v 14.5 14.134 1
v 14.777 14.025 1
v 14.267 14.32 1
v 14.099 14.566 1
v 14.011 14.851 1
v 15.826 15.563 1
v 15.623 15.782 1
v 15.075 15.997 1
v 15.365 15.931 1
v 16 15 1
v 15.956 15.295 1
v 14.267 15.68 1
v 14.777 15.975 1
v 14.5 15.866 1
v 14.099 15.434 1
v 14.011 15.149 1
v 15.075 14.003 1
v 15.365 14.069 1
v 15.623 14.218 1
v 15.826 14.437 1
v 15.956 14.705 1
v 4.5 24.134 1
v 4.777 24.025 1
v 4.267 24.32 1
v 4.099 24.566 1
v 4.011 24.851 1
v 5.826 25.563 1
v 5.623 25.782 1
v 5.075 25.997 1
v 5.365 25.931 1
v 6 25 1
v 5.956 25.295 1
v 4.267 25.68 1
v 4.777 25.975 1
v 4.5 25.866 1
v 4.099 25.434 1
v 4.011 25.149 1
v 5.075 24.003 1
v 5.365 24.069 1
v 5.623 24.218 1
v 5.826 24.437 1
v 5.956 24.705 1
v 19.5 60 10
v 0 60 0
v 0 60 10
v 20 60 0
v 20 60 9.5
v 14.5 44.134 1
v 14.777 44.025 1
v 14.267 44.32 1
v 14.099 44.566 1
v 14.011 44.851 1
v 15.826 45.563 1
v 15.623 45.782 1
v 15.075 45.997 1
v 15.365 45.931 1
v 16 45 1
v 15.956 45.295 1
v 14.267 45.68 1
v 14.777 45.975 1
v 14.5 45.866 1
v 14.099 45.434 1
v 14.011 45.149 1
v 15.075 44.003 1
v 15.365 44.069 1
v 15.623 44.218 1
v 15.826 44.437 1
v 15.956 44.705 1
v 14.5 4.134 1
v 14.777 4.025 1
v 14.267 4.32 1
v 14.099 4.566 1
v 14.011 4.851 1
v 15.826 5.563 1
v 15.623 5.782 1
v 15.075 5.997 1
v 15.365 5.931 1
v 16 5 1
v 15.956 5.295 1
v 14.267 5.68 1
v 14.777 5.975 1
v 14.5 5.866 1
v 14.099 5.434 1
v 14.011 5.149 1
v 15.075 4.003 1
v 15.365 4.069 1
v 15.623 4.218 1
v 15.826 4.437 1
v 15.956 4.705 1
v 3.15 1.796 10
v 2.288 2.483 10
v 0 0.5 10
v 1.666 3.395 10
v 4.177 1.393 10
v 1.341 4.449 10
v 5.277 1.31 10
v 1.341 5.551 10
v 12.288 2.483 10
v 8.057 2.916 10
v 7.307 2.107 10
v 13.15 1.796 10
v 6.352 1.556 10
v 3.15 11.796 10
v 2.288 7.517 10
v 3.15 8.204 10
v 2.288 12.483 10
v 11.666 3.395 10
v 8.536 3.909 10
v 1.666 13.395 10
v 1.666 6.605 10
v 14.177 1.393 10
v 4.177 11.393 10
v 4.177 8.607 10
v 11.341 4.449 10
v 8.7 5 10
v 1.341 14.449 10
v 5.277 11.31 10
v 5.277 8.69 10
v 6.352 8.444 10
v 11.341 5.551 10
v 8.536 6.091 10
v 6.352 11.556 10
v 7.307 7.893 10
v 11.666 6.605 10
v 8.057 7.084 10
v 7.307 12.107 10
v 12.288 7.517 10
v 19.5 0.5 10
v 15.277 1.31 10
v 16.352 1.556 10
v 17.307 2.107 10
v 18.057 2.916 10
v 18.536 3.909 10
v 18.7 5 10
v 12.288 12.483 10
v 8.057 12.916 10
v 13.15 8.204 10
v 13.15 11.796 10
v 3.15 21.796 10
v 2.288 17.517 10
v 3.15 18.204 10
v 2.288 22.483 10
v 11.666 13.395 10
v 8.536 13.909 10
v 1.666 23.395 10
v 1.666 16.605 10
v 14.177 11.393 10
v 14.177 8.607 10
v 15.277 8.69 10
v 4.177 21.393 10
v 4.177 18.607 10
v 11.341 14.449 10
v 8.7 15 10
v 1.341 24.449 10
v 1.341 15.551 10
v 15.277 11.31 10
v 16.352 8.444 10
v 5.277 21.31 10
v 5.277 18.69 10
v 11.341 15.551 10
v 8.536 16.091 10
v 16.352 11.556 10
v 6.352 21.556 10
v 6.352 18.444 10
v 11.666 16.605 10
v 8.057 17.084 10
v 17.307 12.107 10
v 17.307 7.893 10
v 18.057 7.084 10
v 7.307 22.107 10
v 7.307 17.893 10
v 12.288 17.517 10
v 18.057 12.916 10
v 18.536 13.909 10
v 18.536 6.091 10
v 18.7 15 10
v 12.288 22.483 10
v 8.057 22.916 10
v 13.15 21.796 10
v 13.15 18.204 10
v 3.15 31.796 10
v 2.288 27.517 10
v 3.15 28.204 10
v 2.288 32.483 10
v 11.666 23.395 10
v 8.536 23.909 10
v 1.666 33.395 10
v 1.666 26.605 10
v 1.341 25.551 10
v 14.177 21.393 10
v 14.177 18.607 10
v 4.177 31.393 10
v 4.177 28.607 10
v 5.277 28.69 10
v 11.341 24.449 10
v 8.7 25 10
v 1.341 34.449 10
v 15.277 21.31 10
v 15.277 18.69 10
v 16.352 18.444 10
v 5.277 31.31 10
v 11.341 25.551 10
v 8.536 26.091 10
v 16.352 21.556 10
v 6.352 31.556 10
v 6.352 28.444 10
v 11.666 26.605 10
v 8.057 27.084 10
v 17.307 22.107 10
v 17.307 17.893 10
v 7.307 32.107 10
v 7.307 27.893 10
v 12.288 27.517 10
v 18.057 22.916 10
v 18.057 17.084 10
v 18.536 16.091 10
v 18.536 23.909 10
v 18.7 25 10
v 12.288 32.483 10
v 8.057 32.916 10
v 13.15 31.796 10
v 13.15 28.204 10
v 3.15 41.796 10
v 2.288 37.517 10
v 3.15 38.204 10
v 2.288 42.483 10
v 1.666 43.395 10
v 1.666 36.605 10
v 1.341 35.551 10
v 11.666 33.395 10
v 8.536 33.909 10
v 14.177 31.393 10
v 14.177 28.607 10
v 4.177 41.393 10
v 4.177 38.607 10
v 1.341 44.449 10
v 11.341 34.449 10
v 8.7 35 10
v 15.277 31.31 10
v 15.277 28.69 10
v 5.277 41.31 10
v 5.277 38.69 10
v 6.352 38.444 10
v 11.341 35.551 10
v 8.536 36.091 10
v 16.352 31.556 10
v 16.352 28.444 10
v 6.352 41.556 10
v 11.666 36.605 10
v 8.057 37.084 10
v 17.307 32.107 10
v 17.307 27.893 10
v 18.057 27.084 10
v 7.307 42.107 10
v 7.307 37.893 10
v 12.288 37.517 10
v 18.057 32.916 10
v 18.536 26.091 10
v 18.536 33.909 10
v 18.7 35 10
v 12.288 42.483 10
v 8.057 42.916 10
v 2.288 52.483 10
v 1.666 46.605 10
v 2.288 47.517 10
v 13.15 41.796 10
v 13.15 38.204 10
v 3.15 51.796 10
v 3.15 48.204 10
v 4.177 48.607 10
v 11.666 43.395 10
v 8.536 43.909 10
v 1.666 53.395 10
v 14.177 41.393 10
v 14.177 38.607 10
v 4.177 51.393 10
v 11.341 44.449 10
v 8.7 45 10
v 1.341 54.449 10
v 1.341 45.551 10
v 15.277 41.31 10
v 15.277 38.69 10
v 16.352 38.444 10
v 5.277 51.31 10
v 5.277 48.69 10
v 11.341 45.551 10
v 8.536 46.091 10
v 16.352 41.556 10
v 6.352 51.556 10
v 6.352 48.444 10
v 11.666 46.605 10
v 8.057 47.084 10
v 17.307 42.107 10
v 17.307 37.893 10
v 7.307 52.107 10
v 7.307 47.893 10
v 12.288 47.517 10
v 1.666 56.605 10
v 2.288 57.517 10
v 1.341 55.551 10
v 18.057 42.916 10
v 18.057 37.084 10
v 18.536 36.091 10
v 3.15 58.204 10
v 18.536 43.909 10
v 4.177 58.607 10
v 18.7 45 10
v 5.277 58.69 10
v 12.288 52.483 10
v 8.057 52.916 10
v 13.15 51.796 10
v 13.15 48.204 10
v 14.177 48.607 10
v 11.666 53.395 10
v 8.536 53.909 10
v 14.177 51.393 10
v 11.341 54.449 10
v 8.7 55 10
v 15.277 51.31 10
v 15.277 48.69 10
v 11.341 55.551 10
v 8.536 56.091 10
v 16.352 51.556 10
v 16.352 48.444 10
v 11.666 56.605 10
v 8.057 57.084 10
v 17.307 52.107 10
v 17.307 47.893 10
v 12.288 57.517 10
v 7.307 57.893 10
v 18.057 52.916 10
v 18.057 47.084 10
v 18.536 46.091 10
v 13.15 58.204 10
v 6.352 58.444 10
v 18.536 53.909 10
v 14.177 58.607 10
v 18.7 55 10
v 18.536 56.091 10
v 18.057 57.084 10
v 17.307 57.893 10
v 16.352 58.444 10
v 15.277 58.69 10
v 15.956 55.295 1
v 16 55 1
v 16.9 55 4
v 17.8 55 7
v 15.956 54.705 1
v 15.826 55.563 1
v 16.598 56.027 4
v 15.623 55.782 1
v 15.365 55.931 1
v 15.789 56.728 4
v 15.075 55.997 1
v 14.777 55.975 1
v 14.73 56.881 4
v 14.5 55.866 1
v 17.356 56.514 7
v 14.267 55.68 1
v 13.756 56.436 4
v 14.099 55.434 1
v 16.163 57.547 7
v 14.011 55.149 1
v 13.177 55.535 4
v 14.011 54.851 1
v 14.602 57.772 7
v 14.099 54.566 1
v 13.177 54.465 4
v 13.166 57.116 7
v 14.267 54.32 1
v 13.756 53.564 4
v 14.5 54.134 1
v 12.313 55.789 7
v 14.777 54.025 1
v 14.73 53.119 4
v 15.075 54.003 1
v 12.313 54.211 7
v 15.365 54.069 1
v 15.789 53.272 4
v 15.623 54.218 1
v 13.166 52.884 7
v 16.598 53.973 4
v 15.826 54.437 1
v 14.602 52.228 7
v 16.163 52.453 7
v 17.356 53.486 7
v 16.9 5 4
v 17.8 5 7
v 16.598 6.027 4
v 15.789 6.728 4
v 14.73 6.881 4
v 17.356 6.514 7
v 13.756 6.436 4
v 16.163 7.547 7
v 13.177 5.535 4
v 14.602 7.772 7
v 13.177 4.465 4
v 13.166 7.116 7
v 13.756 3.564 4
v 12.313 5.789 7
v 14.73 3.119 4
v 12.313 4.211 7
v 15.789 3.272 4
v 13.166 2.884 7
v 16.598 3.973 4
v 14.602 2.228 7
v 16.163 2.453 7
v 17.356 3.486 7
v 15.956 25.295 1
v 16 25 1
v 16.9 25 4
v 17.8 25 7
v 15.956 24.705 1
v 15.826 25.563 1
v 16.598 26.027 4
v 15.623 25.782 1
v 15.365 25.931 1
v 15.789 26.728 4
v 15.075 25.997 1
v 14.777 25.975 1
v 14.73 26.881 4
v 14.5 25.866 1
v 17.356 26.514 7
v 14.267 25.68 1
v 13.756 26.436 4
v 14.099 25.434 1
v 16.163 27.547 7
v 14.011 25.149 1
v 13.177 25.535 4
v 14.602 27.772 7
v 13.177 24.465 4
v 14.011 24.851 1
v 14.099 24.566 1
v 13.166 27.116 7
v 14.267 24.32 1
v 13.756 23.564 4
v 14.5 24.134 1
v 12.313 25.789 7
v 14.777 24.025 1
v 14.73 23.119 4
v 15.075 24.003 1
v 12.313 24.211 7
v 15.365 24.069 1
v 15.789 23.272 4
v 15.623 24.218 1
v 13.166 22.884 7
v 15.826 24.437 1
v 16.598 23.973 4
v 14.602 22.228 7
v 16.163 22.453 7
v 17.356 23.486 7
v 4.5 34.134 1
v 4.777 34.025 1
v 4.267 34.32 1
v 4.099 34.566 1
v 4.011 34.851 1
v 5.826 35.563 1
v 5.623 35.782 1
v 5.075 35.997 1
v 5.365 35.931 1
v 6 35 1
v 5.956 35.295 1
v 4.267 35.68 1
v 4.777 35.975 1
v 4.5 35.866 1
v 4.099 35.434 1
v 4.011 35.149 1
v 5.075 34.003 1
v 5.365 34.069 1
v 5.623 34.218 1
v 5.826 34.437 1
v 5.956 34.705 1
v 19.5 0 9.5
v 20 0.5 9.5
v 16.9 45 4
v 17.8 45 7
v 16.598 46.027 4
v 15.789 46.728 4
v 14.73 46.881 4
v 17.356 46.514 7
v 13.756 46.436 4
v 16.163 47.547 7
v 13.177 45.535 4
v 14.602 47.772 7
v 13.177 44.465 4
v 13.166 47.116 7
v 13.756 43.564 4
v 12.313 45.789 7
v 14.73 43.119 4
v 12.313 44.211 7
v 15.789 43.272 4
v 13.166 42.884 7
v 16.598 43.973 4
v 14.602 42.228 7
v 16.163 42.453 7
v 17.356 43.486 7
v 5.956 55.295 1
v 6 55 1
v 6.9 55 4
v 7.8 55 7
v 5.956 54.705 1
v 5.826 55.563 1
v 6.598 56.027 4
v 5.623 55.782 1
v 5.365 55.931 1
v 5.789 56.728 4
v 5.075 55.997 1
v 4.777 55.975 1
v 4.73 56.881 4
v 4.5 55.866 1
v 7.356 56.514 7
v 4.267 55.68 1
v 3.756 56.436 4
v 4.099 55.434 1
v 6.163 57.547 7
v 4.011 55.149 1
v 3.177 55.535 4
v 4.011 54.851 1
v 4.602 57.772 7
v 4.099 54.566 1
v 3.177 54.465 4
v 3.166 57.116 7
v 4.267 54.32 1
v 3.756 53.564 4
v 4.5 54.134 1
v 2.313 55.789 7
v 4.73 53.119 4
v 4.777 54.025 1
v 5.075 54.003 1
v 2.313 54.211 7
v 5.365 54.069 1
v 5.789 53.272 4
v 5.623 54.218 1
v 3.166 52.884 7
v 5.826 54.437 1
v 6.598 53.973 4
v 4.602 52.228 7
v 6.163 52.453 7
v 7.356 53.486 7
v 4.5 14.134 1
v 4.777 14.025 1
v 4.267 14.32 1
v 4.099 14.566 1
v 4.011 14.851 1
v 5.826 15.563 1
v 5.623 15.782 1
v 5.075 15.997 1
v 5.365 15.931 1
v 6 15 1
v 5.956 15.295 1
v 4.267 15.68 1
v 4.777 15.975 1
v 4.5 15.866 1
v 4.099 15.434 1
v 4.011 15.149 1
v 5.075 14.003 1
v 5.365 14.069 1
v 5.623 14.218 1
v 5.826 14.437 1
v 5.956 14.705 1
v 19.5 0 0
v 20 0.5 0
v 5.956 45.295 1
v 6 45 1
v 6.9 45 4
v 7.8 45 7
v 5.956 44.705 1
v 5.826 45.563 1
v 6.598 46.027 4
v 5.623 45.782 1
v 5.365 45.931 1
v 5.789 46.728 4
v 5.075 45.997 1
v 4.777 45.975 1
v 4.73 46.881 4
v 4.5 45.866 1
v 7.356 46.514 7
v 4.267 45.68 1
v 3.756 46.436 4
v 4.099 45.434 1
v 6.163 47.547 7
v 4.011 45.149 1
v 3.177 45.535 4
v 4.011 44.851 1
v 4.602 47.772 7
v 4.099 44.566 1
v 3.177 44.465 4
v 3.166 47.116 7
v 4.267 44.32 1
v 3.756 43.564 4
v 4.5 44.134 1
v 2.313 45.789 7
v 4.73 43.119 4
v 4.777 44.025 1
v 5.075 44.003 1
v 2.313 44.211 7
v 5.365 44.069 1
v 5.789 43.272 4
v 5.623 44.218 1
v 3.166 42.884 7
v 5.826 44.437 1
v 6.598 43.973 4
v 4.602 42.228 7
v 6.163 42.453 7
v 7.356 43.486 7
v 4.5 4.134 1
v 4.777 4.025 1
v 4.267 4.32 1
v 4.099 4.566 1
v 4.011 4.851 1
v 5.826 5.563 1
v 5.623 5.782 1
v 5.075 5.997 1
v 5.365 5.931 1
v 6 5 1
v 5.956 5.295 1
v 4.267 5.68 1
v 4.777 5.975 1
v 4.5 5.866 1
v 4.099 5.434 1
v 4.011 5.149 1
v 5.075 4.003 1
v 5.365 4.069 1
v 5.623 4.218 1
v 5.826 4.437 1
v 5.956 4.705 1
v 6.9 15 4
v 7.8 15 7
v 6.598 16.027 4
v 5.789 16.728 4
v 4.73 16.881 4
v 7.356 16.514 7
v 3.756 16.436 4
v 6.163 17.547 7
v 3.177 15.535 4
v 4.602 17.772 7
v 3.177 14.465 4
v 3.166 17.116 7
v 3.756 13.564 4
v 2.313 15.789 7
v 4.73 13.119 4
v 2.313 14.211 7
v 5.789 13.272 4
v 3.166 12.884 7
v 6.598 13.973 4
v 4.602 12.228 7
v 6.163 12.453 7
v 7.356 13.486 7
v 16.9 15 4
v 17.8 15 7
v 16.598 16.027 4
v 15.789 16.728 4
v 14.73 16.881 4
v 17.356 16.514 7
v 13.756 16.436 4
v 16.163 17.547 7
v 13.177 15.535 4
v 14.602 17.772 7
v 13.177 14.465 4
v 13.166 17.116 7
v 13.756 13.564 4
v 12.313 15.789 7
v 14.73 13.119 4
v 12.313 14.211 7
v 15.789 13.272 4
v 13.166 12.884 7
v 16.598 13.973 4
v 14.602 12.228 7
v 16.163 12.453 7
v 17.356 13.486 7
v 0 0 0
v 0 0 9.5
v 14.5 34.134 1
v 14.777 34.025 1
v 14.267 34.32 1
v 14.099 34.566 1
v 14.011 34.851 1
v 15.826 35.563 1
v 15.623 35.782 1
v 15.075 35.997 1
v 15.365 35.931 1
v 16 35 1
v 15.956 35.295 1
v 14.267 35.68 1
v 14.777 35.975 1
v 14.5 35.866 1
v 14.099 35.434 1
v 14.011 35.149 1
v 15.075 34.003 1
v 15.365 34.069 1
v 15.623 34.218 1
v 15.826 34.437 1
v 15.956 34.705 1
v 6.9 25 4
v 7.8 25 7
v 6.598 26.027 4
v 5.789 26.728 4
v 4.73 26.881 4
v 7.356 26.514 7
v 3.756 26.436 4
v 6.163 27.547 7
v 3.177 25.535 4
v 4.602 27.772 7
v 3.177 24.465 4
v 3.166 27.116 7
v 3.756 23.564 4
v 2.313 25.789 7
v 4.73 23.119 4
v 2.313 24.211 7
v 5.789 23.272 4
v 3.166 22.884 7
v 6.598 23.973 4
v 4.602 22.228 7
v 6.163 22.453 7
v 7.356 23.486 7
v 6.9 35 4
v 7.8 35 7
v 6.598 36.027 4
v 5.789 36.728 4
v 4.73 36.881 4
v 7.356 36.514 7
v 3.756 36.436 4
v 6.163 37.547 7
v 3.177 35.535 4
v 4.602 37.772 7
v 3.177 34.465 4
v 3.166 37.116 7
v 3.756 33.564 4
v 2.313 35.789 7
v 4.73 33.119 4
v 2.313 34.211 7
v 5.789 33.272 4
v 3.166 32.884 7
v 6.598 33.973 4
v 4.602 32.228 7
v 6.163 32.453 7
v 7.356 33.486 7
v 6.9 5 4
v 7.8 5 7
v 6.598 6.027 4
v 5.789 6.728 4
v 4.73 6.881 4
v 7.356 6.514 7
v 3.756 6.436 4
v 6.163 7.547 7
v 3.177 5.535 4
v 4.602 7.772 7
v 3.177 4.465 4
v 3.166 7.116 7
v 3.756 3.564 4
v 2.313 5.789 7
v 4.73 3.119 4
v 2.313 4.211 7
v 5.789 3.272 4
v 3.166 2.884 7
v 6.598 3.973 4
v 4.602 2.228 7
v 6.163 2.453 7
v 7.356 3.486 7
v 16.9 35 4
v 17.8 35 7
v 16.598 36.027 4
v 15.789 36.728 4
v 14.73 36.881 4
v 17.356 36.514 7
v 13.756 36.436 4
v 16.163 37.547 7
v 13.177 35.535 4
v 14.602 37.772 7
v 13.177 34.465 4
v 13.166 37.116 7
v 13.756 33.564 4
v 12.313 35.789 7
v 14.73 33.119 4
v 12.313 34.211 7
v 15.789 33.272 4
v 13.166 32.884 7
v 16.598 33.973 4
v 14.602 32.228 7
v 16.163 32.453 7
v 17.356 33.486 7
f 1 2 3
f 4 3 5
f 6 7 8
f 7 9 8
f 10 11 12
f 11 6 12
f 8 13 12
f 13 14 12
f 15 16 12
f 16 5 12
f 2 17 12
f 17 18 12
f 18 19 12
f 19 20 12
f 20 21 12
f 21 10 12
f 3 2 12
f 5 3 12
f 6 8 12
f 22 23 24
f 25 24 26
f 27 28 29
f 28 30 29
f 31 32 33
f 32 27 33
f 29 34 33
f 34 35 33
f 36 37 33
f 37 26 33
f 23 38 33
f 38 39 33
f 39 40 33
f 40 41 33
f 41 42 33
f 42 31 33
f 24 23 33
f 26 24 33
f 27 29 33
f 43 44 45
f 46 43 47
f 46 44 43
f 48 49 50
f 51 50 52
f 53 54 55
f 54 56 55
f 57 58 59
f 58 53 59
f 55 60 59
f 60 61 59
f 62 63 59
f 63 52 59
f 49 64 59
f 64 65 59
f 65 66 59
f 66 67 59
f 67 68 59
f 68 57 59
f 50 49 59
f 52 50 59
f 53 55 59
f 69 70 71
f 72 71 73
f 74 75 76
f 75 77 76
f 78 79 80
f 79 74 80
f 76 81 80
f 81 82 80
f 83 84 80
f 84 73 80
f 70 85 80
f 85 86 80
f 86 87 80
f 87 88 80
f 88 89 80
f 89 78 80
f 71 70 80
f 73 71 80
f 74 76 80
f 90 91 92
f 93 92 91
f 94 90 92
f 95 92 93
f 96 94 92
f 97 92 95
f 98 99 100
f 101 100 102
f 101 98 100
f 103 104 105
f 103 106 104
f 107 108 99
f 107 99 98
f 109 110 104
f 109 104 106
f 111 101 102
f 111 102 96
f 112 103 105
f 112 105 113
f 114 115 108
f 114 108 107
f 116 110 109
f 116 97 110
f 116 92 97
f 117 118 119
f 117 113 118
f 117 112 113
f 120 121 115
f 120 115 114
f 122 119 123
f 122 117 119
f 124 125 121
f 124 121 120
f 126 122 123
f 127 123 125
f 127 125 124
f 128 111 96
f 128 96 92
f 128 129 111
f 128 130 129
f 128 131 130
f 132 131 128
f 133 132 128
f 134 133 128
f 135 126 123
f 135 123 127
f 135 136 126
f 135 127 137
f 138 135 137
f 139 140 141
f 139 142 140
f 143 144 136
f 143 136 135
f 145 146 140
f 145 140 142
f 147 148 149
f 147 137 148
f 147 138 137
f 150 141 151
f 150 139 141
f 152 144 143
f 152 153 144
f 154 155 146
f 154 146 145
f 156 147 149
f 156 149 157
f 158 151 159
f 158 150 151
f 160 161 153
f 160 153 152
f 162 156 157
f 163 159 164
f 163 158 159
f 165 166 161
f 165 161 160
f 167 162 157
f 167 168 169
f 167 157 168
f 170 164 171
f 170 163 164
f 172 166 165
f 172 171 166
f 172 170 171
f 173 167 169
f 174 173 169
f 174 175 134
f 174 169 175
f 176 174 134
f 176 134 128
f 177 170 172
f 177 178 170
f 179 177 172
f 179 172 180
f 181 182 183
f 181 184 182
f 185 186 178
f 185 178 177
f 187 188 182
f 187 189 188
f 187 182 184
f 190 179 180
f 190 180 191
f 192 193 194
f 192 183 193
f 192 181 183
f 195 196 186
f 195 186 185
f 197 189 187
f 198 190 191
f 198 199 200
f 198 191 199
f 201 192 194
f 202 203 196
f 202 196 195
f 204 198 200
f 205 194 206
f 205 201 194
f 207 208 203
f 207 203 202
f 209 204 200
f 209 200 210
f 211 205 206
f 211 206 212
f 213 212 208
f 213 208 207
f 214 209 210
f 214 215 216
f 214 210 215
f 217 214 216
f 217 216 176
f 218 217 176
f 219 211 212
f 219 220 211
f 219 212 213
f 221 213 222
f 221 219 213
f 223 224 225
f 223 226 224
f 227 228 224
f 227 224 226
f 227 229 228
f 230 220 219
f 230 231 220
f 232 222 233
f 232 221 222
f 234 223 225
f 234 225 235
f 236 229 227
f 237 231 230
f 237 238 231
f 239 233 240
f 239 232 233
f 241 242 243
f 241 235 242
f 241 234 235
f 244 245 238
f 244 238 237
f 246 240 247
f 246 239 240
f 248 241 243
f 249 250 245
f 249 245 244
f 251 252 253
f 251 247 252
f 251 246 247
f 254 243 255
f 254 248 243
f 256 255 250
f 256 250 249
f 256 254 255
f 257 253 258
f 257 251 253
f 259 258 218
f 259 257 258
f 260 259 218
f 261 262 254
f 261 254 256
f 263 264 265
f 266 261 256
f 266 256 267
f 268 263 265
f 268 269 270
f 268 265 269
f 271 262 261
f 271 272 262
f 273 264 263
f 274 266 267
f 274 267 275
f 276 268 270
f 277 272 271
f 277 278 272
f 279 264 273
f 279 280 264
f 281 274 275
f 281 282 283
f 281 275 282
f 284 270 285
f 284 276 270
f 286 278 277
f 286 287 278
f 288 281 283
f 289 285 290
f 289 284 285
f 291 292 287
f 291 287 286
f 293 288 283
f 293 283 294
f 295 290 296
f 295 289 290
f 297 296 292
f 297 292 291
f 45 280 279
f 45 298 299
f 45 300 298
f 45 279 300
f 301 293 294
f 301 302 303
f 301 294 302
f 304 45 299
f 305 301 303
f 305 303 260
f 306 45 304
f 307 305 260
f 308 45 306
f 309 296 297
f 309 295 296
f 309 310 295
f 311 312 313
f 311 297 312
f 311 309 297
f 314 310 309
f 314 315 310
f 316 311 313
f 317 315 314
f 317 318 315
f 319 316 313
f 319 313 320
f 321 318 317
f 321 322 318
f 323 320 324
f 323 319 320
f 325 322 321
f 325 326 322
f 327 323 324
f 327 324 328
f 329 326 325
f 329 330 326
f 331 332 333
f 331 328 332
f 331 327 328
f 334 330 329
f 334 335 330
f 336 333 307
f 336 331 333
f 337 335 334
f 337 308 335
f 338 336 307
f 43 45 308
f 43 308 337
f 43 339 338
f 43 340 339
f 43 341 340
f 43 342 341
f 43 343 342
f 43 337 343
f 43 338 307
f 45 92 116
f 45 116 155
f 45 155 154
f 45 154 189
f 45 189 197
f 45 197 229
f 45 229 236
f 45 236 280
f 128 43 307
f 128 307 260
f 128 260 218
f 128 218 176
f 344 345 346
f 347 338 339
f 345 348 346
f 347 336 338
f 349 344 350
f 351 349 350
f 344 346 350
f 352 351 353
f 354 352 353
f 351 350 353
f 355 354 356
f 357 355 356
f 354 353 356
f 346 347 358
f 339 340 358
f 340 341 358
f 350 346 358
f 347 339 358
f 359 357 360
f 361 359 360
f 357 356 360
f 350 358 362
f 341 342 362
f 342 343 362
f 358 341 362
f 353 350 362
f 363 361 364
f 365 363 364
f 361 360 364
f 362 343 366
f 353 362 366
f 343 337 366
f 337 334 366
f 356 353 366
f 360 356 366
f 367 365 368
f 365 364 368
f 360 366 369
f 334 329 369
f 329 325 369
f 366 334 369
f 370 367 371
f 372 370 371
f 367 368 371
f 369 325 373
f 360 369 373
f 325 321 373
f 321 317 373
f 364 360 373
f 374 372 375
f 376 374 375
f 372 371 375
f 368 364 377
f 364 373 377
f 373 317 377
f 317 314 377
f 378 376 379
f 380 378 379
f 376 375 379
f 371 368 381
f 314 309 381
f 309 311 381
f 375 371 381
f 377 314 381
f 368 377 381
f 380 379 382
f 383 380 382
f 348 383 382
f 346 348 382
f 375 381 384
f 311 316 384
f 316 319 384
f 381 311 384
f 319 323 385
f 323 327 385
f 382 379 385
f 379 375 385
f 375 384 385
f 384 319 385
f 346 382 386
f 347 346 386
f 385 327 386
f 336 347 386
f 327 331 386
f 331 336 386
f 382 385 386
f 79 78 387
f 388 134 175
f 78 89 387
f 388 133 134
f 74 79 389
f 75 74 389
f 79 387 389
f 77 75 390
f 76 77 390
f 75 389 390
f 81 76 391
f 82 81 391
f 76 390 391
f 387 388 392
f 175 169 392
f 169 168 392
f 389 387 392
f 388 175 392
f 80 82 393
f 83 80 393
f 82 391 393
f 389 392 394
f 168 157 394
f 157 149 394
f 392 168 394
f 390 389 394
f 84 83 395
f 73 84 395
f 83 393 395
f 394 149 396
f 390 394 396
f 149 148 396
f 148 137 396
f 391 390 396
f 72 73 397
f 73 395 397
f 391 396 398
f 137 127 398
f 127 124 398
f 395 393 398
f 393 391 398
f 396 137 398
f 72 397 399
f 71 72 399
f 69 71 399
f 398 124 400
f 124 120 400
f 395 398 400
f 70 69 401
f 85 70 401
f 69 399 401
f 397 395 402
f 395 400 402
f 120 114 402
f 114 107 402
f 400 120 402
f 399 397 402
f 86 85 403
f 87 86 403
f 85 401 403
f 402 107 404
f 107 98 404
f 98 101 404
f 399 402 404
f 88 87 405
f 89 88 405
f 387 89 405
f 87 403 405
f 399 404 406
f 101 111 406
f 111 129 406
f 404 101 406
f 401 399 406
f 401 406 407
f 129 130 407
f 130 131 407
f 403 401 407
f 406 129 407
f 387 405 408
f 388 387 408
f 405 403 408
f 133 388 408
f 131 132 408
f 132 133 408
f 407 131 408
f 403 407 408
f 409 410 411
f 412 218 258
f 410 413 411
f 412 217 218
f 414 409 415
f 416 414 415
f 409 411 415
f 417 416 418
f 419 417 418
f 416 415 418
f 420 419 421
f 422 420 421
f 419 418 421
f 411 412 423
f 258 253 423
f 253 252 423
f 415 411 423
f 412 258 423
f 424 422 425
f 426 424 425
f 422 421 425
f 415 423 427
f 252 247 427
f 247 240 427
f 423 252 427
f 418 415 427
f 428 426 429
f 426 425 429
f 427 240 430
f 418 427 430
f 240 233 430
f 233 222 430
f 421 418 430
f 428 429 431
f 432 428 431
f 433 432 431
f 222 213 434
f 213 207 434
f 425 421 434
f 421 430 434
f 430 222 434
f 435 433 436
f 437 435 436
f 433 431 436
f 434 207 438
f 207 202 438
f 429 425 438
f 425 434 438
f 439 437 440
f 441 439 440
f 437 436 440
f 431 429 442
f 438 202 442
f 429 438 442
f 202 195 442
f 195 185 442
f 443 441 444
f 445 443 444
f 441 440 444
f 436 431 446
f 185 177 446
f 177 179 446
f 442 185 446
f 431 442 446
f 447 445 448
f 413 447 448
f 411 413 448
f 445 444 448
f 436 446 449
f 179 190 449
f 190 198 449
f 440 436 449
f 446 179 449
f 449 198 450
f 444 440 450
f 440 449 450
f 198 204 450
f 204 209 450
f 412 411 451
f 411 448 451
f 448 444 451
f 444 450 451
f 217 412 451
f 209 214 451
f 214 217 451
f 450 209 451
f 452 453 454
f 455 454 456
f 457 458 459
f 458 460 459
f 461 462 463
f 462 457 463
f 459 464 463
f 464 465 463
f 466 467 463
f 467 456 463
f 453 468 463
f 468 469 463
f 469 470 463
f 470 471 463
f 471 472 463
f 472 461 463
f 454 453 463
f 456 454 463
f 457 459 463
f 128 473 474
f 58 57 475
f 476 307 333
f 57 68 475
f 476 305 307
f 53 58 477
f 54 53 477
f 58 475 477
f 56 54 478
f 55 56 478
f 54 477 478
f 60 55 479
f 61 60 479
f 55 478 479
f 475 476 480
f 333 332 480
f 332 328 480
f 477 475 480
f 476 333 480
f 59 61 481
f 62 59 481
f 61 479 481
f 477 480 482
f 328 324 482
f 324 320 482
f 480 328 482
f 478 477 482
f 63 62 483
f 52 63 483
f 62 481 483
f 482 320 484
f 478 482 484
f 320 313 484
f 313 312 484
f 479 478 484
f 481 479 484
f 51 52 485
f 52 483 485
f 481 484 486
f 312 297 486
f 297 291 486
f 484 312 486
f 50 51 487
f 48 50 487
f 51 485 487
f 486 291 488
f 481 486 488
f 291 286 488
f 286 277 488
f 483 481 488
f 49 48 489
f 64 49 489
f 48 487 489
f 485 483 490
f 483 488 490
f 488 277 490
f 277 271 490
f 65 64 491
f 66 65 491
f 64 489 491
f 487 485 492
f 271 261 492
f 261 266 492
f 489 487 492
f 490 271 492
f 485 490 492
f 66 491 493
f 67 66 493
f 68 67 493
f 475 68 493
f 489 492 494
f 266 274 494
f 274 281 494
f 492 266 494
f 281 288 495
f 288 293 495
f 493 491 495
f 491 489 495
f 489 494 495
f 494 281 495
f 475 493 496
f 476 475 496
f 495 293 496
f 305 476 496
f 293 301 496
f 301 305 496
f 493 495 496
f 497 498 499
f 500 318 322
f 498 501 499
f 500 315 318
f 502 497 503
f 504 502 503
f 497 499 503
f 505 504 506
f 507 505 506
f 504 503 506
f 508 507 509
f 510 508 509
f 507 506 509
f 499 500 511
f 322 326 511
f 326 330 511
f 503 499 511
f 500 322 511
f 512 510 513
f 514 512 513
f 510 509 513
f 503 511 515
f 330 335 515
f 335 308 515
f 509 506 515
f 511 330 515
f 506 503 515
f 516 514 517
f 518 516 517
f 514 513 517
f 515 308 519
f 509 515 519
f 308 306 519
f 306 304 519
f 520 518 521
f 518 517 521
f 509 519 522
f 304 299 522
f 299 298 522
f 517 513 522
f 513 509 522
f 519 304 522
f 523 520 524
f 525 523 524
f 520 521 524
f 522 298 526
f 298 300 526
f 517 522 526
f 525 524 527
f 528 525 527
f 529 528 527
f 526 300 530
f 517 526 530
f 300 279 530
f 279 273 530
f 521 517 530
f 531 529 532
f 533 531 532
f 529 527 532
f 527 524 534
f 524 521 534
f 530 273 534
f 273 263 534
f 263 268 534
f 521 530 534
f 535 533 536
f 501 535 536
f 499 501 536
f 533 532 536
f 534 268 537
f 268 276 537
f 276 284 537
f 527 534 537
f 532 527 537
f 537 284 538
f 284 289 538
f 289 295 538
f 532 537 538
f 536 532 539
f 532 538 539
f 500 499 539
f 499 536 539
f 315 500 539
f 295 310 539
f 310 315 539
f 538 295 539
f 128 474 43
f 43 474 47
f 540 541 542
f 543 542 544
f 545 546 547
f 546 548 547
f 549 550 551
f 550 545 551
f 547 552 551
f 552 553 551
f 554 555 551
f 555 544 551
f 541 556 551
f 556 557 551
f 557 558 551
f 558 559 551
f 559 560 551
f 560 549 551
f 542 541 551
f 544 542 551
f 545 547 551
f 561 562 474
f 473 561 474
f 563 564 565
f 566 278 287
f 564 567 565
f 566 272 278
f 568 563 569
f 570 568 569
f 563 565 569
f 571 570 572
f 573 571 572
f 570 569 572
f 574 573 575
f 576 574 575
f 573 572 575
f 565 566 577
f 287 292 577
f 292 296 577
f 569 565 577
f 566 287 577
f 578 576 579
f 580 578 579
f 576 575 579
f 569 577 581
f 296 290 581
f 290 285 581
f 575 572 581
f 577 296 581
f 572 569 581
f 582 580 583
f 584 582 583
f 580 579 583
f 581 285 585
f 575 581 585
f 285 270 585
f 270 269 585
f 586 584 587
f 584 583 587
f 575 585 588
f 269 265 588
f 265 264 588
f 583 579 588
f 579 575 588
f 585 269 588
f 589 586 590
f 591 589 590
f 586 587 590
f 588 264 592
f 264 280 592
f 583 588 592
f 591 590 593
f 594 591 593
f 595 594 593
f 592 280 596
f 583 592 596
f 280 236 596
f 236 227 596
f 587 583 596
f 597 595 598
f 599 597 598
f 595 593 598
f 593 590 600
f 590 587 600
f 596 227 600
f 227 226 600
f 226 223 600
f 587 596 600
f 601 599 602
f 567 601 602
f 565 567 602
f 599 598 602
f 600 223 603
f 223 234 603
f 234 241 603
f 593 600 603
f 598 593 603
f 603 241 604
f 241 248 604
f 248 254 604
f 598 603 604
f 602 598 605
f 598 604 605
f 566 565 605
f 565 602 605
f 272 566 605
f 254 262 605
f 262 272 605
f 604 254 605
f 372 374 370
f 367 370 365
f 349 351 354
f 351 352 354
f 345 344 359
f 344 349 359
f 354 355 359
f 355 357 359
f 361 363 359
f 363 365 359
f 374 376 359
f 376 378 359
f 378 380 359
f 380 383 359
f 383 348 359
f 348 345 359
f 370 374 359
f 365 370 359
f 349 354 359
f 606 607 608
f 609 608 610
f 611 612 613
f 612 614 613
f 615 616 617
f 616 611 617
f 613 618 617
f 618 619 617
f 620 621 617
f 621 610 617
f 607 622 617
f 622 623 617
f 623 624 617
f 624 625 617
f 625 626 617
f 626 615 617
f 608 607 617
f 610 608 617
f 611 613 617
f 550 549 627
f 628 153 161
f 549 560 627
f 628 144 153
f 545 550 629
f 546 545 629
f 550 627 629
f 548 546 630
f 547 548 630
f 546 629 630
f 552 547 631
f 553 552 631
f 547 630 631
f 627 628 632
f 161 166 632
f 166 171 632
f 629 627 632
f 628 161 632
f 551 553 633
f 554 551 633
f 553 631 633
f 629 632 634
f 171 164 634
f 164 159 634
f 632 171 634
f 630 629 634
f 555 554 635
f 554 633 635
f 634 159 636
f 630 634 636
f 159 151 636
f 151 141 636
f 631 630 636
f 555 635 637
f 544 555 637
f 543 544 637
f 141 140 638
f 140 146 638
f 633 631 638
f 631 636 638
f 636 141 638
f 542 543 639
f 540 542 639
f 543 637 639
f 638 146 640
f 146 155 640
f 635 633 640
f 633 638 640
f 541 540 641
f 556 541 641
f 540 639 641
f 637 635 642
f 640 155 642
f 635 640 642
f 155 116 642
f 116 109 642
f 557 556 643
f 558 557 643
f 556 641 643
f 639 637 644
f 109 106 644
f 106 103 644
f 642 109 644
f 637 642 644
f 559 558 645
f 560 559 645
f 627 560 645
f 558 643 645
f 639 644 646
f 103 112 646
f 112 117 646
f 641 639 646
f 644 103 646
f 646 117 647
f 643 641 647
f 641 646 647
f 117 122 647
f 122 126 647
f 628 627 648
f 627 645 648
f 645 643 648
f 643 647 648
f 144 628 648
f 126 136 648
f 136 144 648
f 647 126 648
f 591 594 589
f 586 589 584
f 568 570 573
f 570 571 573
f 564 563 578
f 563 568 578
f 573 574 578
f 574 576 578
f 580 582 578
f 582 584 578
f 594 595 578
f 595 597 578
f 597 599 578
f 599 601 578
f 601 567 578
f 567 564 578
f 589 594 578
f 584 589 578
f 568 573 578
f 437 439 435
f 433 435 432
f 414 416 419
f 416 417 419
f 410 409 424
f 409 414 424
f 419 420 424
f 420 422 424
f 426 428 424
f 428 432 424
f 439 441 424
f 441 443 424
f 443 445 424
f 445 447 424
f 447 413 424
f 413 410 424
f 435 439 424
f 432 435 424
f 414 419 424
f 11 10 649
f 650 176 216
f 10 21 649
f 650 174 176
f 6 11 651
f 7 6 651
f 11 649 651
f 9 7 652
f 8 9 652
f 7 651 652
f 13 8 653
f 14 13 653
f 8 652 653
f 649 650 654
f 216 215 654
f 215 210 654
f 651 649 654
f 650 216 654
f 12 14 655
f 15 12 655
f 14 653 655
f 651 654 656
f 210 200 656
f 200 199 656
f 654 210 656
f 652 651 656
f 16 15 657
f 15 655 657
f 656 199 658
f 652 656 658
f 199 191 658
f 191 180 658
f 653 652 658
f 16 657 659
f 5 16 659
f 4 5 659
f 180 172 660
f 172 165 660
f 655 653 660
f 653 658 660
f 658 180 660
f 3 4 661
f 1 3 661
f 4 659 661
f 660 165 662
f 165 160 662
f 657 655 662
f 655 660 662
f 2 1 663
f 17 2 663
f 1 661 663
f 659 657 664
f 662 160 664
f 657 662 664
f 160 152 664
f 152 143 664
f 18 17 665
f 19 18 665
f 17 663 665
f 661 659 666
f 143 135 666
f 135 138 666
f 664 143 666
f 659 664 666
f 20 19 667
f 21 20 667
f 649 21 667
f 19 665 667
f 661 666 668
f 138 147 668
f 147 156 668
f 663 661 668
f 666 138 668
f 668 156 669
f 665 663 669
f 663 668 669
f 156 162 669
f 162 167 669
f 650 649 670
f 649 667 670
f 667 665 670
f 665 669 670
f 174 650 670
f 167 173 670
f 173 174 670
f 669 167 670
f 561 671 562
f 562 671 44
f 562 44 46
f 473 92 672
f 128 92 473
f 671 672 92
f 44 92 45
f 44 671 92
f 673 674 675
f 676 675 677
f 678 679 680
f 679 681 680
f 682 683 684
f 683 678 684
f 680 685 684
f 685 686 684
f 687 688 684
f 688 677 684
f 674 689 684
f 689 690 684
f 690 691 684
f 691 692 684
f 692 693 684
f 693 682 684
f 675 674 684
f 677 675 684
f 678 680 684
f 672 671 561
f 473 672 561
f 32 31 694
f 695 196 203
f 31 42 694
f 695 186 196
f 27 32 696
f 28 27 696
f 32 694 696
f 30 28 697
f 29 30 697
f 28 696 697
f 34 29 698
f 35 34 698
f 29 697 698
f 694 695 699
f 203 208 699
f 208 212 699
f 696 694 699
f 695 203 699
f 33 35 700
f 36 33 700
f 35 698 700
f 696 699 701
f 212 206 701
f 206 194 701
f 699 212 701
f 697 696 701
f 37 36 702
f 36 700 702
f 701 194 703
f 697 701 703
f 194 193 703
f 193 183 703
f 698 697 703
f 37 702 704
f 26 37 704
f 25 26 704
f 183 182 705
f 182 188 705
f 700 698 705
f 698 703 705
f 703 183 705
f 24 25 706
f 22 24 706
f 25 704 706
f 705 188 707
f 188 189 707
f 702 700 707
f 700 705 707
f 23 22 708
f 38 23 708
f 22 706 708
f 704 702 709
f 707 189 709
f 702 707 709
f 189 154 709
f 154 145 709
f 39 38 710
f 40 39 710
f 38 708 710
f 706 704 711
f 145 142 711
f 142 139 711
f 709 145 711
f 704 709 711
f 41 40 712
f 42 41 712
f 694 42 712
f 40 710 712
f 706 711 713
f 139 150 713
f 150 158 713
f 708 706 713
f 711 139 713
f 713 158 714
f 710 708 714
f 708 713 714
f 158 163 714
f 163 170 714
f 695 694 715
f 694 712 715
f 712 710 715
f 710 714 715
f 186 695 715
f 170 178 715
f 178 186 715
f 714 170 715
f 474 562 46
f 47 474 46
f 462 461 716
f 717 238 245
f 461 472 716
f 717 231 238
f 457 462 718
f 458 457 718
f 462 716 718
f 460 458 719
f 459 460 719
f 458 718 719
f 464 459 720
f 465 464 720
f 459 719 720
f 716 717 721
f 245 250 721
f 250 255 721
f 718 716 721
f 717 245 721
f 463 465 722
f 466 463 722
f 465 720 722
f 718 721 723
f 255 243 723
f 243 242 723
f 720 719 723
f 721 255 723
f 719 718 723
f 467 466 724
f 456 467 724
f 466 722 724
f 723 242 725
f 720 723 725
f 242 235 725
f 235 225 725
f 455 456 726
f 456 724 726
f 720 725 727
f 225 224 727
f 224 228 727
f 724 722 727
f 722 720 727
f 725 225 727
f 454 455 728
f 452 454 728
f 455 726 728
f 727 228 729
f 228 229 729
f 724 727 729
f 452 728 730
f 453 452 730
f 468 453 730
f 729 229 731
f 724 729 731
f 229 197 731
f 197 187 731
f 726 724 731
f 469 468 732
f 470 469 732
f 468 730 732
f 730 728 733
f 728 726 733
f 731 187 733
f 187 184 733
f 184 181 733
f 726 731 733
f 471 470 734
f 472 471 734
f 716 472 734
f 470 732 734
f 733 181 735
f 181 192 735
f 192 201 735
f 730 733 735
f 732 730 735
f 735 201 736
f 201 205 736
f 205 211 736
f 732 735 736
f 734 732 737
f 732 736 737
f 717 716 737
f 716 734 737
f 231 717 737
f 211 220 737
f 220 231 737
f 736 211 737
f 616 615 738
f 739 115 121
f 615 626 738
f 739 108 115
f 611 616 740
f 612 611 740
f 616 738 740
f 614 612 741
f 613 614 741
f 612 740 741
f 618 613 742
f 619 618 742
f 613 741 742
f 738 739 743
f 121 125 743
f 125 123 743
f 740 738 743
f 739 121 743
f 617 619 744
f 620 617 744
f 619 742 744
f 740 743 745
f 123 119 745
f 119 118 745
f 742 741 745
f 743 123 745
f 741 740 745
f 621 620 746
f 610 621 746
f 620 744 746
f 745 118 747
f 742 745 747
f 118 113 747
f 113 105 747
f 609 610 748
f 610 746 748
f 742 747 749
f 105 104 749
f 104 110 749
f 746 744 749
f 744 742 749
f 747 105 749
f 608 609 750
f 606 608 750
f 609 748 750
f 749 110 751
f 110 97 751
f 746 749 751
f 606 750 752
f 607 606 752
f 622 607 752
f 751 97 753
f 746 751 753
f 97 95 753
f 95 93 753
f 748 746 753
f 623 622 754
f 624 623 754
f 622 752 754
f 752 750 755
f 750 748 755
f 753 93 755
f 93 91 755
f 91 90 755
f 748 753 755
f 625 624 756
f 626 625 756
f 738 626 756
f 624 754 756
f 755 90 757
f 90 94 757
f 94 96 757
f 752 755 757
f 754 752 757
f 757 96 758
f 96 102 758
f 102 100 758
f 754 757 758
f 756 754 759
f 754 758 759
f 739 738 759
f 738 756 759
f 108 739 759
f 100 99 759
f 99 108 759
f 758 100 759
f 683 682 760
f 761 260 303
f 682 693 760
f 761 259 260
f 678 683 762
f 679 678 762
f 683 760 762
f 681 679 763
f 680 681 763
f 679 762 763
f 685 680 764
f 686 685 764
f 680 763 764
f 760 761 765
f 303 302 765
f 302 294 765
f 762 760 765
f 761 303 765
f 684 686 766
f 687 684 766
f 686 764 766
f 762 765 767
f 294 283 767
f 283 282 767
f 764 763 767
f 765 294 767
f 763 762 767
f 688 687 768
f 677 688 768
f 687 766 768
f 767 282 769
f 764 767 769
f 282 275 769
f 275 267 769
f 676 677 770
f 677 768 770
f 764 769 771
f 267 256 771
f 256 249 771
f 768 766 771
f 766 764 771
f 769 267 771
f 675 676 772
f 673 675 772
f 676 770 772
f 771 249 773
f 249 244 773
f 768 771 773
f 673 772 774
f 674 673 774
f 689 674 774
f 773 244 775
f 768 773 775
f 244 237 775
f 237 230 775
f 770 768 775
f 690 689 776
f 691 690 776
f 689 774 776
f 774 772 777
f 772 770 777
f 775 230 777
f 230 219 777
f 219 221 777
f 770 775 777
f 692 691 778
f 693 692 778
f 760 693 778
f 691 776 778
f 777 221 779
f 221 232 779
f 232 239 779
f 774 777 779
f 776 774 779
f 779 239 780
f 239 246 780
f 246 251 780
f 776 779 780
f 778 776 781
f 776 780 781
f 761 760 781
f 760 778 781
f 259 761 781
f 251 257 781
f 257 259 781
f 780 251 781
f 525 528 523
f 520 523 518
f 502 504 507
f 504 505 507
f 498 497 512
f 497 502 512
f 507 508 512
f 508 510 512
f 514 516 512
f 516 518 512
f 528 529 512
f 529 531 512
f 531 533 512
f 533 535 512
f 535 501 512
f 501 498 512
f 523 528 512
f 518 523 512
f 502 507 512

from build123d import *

# Parameters (mm, degrees)
ARRAY_X_COUNT = 2
ARRAY_X_PITCH = 10
ARRAY_Y_COUNT = 6
ARRAY_Y_PITCH = 10
BOX_W         = 20
BOX_H         = 60
BOX_DEPTH     = 10
CHAMFER_SIZE  = 0.5


with BuildPart() as array:
    # Cone → Cone (revolve)
    with BuildSketch(Plane(origin=(5, 5, 1), x_dir=(1, 0, 0), z_dir=(0, -1, 0))):
        Polygon((0, 0), (1, 0), (4, 10), (0, 10), align=None)
    revolve(axis=Axis((5, 5, 1), (0, 0, 1)))

    # Array X: Array ×2


with BuildPart() as array_1:
    add(array.part)
    with Locations(*[(i * ARRAY_X_PITCH, 0, 0) for i in range(1, ARRAY_X_COUNT)]):
        add(array.part)

    # Array Y: Array ×6


with BuildPart() as array_2:
    add(array_1.part)
    with Locations(*[(0, i * ARRAY_Y_PITCH, 0) for i in range(1, ARRAY_Y_COUNT)]):
        add(array_1.part)


with BuildPart() as chamfer_body:
    # Box → Box (new body)
    with BuildSketch(Plane.XY):
        with Locations((10, 30)):
            Rectangle(BOX_W, BOX_H)
    extrude(amount=BOX_DEPTH)

    # Cut: cut Array
    add(array_2.part, mode=Mode.SUBTRACT)

    # Chamfer
    chamfer_edges = [chamfer_body.edges().sort_by_distance(p)[0] for p in [
        (20, 0, 5),
        (10, 0, 10),
        (20, 30, 10),
    ]]
    chamfer(chamfer_edges, length=CHAMFER_SIZE)


solid = chamfer_body.part
